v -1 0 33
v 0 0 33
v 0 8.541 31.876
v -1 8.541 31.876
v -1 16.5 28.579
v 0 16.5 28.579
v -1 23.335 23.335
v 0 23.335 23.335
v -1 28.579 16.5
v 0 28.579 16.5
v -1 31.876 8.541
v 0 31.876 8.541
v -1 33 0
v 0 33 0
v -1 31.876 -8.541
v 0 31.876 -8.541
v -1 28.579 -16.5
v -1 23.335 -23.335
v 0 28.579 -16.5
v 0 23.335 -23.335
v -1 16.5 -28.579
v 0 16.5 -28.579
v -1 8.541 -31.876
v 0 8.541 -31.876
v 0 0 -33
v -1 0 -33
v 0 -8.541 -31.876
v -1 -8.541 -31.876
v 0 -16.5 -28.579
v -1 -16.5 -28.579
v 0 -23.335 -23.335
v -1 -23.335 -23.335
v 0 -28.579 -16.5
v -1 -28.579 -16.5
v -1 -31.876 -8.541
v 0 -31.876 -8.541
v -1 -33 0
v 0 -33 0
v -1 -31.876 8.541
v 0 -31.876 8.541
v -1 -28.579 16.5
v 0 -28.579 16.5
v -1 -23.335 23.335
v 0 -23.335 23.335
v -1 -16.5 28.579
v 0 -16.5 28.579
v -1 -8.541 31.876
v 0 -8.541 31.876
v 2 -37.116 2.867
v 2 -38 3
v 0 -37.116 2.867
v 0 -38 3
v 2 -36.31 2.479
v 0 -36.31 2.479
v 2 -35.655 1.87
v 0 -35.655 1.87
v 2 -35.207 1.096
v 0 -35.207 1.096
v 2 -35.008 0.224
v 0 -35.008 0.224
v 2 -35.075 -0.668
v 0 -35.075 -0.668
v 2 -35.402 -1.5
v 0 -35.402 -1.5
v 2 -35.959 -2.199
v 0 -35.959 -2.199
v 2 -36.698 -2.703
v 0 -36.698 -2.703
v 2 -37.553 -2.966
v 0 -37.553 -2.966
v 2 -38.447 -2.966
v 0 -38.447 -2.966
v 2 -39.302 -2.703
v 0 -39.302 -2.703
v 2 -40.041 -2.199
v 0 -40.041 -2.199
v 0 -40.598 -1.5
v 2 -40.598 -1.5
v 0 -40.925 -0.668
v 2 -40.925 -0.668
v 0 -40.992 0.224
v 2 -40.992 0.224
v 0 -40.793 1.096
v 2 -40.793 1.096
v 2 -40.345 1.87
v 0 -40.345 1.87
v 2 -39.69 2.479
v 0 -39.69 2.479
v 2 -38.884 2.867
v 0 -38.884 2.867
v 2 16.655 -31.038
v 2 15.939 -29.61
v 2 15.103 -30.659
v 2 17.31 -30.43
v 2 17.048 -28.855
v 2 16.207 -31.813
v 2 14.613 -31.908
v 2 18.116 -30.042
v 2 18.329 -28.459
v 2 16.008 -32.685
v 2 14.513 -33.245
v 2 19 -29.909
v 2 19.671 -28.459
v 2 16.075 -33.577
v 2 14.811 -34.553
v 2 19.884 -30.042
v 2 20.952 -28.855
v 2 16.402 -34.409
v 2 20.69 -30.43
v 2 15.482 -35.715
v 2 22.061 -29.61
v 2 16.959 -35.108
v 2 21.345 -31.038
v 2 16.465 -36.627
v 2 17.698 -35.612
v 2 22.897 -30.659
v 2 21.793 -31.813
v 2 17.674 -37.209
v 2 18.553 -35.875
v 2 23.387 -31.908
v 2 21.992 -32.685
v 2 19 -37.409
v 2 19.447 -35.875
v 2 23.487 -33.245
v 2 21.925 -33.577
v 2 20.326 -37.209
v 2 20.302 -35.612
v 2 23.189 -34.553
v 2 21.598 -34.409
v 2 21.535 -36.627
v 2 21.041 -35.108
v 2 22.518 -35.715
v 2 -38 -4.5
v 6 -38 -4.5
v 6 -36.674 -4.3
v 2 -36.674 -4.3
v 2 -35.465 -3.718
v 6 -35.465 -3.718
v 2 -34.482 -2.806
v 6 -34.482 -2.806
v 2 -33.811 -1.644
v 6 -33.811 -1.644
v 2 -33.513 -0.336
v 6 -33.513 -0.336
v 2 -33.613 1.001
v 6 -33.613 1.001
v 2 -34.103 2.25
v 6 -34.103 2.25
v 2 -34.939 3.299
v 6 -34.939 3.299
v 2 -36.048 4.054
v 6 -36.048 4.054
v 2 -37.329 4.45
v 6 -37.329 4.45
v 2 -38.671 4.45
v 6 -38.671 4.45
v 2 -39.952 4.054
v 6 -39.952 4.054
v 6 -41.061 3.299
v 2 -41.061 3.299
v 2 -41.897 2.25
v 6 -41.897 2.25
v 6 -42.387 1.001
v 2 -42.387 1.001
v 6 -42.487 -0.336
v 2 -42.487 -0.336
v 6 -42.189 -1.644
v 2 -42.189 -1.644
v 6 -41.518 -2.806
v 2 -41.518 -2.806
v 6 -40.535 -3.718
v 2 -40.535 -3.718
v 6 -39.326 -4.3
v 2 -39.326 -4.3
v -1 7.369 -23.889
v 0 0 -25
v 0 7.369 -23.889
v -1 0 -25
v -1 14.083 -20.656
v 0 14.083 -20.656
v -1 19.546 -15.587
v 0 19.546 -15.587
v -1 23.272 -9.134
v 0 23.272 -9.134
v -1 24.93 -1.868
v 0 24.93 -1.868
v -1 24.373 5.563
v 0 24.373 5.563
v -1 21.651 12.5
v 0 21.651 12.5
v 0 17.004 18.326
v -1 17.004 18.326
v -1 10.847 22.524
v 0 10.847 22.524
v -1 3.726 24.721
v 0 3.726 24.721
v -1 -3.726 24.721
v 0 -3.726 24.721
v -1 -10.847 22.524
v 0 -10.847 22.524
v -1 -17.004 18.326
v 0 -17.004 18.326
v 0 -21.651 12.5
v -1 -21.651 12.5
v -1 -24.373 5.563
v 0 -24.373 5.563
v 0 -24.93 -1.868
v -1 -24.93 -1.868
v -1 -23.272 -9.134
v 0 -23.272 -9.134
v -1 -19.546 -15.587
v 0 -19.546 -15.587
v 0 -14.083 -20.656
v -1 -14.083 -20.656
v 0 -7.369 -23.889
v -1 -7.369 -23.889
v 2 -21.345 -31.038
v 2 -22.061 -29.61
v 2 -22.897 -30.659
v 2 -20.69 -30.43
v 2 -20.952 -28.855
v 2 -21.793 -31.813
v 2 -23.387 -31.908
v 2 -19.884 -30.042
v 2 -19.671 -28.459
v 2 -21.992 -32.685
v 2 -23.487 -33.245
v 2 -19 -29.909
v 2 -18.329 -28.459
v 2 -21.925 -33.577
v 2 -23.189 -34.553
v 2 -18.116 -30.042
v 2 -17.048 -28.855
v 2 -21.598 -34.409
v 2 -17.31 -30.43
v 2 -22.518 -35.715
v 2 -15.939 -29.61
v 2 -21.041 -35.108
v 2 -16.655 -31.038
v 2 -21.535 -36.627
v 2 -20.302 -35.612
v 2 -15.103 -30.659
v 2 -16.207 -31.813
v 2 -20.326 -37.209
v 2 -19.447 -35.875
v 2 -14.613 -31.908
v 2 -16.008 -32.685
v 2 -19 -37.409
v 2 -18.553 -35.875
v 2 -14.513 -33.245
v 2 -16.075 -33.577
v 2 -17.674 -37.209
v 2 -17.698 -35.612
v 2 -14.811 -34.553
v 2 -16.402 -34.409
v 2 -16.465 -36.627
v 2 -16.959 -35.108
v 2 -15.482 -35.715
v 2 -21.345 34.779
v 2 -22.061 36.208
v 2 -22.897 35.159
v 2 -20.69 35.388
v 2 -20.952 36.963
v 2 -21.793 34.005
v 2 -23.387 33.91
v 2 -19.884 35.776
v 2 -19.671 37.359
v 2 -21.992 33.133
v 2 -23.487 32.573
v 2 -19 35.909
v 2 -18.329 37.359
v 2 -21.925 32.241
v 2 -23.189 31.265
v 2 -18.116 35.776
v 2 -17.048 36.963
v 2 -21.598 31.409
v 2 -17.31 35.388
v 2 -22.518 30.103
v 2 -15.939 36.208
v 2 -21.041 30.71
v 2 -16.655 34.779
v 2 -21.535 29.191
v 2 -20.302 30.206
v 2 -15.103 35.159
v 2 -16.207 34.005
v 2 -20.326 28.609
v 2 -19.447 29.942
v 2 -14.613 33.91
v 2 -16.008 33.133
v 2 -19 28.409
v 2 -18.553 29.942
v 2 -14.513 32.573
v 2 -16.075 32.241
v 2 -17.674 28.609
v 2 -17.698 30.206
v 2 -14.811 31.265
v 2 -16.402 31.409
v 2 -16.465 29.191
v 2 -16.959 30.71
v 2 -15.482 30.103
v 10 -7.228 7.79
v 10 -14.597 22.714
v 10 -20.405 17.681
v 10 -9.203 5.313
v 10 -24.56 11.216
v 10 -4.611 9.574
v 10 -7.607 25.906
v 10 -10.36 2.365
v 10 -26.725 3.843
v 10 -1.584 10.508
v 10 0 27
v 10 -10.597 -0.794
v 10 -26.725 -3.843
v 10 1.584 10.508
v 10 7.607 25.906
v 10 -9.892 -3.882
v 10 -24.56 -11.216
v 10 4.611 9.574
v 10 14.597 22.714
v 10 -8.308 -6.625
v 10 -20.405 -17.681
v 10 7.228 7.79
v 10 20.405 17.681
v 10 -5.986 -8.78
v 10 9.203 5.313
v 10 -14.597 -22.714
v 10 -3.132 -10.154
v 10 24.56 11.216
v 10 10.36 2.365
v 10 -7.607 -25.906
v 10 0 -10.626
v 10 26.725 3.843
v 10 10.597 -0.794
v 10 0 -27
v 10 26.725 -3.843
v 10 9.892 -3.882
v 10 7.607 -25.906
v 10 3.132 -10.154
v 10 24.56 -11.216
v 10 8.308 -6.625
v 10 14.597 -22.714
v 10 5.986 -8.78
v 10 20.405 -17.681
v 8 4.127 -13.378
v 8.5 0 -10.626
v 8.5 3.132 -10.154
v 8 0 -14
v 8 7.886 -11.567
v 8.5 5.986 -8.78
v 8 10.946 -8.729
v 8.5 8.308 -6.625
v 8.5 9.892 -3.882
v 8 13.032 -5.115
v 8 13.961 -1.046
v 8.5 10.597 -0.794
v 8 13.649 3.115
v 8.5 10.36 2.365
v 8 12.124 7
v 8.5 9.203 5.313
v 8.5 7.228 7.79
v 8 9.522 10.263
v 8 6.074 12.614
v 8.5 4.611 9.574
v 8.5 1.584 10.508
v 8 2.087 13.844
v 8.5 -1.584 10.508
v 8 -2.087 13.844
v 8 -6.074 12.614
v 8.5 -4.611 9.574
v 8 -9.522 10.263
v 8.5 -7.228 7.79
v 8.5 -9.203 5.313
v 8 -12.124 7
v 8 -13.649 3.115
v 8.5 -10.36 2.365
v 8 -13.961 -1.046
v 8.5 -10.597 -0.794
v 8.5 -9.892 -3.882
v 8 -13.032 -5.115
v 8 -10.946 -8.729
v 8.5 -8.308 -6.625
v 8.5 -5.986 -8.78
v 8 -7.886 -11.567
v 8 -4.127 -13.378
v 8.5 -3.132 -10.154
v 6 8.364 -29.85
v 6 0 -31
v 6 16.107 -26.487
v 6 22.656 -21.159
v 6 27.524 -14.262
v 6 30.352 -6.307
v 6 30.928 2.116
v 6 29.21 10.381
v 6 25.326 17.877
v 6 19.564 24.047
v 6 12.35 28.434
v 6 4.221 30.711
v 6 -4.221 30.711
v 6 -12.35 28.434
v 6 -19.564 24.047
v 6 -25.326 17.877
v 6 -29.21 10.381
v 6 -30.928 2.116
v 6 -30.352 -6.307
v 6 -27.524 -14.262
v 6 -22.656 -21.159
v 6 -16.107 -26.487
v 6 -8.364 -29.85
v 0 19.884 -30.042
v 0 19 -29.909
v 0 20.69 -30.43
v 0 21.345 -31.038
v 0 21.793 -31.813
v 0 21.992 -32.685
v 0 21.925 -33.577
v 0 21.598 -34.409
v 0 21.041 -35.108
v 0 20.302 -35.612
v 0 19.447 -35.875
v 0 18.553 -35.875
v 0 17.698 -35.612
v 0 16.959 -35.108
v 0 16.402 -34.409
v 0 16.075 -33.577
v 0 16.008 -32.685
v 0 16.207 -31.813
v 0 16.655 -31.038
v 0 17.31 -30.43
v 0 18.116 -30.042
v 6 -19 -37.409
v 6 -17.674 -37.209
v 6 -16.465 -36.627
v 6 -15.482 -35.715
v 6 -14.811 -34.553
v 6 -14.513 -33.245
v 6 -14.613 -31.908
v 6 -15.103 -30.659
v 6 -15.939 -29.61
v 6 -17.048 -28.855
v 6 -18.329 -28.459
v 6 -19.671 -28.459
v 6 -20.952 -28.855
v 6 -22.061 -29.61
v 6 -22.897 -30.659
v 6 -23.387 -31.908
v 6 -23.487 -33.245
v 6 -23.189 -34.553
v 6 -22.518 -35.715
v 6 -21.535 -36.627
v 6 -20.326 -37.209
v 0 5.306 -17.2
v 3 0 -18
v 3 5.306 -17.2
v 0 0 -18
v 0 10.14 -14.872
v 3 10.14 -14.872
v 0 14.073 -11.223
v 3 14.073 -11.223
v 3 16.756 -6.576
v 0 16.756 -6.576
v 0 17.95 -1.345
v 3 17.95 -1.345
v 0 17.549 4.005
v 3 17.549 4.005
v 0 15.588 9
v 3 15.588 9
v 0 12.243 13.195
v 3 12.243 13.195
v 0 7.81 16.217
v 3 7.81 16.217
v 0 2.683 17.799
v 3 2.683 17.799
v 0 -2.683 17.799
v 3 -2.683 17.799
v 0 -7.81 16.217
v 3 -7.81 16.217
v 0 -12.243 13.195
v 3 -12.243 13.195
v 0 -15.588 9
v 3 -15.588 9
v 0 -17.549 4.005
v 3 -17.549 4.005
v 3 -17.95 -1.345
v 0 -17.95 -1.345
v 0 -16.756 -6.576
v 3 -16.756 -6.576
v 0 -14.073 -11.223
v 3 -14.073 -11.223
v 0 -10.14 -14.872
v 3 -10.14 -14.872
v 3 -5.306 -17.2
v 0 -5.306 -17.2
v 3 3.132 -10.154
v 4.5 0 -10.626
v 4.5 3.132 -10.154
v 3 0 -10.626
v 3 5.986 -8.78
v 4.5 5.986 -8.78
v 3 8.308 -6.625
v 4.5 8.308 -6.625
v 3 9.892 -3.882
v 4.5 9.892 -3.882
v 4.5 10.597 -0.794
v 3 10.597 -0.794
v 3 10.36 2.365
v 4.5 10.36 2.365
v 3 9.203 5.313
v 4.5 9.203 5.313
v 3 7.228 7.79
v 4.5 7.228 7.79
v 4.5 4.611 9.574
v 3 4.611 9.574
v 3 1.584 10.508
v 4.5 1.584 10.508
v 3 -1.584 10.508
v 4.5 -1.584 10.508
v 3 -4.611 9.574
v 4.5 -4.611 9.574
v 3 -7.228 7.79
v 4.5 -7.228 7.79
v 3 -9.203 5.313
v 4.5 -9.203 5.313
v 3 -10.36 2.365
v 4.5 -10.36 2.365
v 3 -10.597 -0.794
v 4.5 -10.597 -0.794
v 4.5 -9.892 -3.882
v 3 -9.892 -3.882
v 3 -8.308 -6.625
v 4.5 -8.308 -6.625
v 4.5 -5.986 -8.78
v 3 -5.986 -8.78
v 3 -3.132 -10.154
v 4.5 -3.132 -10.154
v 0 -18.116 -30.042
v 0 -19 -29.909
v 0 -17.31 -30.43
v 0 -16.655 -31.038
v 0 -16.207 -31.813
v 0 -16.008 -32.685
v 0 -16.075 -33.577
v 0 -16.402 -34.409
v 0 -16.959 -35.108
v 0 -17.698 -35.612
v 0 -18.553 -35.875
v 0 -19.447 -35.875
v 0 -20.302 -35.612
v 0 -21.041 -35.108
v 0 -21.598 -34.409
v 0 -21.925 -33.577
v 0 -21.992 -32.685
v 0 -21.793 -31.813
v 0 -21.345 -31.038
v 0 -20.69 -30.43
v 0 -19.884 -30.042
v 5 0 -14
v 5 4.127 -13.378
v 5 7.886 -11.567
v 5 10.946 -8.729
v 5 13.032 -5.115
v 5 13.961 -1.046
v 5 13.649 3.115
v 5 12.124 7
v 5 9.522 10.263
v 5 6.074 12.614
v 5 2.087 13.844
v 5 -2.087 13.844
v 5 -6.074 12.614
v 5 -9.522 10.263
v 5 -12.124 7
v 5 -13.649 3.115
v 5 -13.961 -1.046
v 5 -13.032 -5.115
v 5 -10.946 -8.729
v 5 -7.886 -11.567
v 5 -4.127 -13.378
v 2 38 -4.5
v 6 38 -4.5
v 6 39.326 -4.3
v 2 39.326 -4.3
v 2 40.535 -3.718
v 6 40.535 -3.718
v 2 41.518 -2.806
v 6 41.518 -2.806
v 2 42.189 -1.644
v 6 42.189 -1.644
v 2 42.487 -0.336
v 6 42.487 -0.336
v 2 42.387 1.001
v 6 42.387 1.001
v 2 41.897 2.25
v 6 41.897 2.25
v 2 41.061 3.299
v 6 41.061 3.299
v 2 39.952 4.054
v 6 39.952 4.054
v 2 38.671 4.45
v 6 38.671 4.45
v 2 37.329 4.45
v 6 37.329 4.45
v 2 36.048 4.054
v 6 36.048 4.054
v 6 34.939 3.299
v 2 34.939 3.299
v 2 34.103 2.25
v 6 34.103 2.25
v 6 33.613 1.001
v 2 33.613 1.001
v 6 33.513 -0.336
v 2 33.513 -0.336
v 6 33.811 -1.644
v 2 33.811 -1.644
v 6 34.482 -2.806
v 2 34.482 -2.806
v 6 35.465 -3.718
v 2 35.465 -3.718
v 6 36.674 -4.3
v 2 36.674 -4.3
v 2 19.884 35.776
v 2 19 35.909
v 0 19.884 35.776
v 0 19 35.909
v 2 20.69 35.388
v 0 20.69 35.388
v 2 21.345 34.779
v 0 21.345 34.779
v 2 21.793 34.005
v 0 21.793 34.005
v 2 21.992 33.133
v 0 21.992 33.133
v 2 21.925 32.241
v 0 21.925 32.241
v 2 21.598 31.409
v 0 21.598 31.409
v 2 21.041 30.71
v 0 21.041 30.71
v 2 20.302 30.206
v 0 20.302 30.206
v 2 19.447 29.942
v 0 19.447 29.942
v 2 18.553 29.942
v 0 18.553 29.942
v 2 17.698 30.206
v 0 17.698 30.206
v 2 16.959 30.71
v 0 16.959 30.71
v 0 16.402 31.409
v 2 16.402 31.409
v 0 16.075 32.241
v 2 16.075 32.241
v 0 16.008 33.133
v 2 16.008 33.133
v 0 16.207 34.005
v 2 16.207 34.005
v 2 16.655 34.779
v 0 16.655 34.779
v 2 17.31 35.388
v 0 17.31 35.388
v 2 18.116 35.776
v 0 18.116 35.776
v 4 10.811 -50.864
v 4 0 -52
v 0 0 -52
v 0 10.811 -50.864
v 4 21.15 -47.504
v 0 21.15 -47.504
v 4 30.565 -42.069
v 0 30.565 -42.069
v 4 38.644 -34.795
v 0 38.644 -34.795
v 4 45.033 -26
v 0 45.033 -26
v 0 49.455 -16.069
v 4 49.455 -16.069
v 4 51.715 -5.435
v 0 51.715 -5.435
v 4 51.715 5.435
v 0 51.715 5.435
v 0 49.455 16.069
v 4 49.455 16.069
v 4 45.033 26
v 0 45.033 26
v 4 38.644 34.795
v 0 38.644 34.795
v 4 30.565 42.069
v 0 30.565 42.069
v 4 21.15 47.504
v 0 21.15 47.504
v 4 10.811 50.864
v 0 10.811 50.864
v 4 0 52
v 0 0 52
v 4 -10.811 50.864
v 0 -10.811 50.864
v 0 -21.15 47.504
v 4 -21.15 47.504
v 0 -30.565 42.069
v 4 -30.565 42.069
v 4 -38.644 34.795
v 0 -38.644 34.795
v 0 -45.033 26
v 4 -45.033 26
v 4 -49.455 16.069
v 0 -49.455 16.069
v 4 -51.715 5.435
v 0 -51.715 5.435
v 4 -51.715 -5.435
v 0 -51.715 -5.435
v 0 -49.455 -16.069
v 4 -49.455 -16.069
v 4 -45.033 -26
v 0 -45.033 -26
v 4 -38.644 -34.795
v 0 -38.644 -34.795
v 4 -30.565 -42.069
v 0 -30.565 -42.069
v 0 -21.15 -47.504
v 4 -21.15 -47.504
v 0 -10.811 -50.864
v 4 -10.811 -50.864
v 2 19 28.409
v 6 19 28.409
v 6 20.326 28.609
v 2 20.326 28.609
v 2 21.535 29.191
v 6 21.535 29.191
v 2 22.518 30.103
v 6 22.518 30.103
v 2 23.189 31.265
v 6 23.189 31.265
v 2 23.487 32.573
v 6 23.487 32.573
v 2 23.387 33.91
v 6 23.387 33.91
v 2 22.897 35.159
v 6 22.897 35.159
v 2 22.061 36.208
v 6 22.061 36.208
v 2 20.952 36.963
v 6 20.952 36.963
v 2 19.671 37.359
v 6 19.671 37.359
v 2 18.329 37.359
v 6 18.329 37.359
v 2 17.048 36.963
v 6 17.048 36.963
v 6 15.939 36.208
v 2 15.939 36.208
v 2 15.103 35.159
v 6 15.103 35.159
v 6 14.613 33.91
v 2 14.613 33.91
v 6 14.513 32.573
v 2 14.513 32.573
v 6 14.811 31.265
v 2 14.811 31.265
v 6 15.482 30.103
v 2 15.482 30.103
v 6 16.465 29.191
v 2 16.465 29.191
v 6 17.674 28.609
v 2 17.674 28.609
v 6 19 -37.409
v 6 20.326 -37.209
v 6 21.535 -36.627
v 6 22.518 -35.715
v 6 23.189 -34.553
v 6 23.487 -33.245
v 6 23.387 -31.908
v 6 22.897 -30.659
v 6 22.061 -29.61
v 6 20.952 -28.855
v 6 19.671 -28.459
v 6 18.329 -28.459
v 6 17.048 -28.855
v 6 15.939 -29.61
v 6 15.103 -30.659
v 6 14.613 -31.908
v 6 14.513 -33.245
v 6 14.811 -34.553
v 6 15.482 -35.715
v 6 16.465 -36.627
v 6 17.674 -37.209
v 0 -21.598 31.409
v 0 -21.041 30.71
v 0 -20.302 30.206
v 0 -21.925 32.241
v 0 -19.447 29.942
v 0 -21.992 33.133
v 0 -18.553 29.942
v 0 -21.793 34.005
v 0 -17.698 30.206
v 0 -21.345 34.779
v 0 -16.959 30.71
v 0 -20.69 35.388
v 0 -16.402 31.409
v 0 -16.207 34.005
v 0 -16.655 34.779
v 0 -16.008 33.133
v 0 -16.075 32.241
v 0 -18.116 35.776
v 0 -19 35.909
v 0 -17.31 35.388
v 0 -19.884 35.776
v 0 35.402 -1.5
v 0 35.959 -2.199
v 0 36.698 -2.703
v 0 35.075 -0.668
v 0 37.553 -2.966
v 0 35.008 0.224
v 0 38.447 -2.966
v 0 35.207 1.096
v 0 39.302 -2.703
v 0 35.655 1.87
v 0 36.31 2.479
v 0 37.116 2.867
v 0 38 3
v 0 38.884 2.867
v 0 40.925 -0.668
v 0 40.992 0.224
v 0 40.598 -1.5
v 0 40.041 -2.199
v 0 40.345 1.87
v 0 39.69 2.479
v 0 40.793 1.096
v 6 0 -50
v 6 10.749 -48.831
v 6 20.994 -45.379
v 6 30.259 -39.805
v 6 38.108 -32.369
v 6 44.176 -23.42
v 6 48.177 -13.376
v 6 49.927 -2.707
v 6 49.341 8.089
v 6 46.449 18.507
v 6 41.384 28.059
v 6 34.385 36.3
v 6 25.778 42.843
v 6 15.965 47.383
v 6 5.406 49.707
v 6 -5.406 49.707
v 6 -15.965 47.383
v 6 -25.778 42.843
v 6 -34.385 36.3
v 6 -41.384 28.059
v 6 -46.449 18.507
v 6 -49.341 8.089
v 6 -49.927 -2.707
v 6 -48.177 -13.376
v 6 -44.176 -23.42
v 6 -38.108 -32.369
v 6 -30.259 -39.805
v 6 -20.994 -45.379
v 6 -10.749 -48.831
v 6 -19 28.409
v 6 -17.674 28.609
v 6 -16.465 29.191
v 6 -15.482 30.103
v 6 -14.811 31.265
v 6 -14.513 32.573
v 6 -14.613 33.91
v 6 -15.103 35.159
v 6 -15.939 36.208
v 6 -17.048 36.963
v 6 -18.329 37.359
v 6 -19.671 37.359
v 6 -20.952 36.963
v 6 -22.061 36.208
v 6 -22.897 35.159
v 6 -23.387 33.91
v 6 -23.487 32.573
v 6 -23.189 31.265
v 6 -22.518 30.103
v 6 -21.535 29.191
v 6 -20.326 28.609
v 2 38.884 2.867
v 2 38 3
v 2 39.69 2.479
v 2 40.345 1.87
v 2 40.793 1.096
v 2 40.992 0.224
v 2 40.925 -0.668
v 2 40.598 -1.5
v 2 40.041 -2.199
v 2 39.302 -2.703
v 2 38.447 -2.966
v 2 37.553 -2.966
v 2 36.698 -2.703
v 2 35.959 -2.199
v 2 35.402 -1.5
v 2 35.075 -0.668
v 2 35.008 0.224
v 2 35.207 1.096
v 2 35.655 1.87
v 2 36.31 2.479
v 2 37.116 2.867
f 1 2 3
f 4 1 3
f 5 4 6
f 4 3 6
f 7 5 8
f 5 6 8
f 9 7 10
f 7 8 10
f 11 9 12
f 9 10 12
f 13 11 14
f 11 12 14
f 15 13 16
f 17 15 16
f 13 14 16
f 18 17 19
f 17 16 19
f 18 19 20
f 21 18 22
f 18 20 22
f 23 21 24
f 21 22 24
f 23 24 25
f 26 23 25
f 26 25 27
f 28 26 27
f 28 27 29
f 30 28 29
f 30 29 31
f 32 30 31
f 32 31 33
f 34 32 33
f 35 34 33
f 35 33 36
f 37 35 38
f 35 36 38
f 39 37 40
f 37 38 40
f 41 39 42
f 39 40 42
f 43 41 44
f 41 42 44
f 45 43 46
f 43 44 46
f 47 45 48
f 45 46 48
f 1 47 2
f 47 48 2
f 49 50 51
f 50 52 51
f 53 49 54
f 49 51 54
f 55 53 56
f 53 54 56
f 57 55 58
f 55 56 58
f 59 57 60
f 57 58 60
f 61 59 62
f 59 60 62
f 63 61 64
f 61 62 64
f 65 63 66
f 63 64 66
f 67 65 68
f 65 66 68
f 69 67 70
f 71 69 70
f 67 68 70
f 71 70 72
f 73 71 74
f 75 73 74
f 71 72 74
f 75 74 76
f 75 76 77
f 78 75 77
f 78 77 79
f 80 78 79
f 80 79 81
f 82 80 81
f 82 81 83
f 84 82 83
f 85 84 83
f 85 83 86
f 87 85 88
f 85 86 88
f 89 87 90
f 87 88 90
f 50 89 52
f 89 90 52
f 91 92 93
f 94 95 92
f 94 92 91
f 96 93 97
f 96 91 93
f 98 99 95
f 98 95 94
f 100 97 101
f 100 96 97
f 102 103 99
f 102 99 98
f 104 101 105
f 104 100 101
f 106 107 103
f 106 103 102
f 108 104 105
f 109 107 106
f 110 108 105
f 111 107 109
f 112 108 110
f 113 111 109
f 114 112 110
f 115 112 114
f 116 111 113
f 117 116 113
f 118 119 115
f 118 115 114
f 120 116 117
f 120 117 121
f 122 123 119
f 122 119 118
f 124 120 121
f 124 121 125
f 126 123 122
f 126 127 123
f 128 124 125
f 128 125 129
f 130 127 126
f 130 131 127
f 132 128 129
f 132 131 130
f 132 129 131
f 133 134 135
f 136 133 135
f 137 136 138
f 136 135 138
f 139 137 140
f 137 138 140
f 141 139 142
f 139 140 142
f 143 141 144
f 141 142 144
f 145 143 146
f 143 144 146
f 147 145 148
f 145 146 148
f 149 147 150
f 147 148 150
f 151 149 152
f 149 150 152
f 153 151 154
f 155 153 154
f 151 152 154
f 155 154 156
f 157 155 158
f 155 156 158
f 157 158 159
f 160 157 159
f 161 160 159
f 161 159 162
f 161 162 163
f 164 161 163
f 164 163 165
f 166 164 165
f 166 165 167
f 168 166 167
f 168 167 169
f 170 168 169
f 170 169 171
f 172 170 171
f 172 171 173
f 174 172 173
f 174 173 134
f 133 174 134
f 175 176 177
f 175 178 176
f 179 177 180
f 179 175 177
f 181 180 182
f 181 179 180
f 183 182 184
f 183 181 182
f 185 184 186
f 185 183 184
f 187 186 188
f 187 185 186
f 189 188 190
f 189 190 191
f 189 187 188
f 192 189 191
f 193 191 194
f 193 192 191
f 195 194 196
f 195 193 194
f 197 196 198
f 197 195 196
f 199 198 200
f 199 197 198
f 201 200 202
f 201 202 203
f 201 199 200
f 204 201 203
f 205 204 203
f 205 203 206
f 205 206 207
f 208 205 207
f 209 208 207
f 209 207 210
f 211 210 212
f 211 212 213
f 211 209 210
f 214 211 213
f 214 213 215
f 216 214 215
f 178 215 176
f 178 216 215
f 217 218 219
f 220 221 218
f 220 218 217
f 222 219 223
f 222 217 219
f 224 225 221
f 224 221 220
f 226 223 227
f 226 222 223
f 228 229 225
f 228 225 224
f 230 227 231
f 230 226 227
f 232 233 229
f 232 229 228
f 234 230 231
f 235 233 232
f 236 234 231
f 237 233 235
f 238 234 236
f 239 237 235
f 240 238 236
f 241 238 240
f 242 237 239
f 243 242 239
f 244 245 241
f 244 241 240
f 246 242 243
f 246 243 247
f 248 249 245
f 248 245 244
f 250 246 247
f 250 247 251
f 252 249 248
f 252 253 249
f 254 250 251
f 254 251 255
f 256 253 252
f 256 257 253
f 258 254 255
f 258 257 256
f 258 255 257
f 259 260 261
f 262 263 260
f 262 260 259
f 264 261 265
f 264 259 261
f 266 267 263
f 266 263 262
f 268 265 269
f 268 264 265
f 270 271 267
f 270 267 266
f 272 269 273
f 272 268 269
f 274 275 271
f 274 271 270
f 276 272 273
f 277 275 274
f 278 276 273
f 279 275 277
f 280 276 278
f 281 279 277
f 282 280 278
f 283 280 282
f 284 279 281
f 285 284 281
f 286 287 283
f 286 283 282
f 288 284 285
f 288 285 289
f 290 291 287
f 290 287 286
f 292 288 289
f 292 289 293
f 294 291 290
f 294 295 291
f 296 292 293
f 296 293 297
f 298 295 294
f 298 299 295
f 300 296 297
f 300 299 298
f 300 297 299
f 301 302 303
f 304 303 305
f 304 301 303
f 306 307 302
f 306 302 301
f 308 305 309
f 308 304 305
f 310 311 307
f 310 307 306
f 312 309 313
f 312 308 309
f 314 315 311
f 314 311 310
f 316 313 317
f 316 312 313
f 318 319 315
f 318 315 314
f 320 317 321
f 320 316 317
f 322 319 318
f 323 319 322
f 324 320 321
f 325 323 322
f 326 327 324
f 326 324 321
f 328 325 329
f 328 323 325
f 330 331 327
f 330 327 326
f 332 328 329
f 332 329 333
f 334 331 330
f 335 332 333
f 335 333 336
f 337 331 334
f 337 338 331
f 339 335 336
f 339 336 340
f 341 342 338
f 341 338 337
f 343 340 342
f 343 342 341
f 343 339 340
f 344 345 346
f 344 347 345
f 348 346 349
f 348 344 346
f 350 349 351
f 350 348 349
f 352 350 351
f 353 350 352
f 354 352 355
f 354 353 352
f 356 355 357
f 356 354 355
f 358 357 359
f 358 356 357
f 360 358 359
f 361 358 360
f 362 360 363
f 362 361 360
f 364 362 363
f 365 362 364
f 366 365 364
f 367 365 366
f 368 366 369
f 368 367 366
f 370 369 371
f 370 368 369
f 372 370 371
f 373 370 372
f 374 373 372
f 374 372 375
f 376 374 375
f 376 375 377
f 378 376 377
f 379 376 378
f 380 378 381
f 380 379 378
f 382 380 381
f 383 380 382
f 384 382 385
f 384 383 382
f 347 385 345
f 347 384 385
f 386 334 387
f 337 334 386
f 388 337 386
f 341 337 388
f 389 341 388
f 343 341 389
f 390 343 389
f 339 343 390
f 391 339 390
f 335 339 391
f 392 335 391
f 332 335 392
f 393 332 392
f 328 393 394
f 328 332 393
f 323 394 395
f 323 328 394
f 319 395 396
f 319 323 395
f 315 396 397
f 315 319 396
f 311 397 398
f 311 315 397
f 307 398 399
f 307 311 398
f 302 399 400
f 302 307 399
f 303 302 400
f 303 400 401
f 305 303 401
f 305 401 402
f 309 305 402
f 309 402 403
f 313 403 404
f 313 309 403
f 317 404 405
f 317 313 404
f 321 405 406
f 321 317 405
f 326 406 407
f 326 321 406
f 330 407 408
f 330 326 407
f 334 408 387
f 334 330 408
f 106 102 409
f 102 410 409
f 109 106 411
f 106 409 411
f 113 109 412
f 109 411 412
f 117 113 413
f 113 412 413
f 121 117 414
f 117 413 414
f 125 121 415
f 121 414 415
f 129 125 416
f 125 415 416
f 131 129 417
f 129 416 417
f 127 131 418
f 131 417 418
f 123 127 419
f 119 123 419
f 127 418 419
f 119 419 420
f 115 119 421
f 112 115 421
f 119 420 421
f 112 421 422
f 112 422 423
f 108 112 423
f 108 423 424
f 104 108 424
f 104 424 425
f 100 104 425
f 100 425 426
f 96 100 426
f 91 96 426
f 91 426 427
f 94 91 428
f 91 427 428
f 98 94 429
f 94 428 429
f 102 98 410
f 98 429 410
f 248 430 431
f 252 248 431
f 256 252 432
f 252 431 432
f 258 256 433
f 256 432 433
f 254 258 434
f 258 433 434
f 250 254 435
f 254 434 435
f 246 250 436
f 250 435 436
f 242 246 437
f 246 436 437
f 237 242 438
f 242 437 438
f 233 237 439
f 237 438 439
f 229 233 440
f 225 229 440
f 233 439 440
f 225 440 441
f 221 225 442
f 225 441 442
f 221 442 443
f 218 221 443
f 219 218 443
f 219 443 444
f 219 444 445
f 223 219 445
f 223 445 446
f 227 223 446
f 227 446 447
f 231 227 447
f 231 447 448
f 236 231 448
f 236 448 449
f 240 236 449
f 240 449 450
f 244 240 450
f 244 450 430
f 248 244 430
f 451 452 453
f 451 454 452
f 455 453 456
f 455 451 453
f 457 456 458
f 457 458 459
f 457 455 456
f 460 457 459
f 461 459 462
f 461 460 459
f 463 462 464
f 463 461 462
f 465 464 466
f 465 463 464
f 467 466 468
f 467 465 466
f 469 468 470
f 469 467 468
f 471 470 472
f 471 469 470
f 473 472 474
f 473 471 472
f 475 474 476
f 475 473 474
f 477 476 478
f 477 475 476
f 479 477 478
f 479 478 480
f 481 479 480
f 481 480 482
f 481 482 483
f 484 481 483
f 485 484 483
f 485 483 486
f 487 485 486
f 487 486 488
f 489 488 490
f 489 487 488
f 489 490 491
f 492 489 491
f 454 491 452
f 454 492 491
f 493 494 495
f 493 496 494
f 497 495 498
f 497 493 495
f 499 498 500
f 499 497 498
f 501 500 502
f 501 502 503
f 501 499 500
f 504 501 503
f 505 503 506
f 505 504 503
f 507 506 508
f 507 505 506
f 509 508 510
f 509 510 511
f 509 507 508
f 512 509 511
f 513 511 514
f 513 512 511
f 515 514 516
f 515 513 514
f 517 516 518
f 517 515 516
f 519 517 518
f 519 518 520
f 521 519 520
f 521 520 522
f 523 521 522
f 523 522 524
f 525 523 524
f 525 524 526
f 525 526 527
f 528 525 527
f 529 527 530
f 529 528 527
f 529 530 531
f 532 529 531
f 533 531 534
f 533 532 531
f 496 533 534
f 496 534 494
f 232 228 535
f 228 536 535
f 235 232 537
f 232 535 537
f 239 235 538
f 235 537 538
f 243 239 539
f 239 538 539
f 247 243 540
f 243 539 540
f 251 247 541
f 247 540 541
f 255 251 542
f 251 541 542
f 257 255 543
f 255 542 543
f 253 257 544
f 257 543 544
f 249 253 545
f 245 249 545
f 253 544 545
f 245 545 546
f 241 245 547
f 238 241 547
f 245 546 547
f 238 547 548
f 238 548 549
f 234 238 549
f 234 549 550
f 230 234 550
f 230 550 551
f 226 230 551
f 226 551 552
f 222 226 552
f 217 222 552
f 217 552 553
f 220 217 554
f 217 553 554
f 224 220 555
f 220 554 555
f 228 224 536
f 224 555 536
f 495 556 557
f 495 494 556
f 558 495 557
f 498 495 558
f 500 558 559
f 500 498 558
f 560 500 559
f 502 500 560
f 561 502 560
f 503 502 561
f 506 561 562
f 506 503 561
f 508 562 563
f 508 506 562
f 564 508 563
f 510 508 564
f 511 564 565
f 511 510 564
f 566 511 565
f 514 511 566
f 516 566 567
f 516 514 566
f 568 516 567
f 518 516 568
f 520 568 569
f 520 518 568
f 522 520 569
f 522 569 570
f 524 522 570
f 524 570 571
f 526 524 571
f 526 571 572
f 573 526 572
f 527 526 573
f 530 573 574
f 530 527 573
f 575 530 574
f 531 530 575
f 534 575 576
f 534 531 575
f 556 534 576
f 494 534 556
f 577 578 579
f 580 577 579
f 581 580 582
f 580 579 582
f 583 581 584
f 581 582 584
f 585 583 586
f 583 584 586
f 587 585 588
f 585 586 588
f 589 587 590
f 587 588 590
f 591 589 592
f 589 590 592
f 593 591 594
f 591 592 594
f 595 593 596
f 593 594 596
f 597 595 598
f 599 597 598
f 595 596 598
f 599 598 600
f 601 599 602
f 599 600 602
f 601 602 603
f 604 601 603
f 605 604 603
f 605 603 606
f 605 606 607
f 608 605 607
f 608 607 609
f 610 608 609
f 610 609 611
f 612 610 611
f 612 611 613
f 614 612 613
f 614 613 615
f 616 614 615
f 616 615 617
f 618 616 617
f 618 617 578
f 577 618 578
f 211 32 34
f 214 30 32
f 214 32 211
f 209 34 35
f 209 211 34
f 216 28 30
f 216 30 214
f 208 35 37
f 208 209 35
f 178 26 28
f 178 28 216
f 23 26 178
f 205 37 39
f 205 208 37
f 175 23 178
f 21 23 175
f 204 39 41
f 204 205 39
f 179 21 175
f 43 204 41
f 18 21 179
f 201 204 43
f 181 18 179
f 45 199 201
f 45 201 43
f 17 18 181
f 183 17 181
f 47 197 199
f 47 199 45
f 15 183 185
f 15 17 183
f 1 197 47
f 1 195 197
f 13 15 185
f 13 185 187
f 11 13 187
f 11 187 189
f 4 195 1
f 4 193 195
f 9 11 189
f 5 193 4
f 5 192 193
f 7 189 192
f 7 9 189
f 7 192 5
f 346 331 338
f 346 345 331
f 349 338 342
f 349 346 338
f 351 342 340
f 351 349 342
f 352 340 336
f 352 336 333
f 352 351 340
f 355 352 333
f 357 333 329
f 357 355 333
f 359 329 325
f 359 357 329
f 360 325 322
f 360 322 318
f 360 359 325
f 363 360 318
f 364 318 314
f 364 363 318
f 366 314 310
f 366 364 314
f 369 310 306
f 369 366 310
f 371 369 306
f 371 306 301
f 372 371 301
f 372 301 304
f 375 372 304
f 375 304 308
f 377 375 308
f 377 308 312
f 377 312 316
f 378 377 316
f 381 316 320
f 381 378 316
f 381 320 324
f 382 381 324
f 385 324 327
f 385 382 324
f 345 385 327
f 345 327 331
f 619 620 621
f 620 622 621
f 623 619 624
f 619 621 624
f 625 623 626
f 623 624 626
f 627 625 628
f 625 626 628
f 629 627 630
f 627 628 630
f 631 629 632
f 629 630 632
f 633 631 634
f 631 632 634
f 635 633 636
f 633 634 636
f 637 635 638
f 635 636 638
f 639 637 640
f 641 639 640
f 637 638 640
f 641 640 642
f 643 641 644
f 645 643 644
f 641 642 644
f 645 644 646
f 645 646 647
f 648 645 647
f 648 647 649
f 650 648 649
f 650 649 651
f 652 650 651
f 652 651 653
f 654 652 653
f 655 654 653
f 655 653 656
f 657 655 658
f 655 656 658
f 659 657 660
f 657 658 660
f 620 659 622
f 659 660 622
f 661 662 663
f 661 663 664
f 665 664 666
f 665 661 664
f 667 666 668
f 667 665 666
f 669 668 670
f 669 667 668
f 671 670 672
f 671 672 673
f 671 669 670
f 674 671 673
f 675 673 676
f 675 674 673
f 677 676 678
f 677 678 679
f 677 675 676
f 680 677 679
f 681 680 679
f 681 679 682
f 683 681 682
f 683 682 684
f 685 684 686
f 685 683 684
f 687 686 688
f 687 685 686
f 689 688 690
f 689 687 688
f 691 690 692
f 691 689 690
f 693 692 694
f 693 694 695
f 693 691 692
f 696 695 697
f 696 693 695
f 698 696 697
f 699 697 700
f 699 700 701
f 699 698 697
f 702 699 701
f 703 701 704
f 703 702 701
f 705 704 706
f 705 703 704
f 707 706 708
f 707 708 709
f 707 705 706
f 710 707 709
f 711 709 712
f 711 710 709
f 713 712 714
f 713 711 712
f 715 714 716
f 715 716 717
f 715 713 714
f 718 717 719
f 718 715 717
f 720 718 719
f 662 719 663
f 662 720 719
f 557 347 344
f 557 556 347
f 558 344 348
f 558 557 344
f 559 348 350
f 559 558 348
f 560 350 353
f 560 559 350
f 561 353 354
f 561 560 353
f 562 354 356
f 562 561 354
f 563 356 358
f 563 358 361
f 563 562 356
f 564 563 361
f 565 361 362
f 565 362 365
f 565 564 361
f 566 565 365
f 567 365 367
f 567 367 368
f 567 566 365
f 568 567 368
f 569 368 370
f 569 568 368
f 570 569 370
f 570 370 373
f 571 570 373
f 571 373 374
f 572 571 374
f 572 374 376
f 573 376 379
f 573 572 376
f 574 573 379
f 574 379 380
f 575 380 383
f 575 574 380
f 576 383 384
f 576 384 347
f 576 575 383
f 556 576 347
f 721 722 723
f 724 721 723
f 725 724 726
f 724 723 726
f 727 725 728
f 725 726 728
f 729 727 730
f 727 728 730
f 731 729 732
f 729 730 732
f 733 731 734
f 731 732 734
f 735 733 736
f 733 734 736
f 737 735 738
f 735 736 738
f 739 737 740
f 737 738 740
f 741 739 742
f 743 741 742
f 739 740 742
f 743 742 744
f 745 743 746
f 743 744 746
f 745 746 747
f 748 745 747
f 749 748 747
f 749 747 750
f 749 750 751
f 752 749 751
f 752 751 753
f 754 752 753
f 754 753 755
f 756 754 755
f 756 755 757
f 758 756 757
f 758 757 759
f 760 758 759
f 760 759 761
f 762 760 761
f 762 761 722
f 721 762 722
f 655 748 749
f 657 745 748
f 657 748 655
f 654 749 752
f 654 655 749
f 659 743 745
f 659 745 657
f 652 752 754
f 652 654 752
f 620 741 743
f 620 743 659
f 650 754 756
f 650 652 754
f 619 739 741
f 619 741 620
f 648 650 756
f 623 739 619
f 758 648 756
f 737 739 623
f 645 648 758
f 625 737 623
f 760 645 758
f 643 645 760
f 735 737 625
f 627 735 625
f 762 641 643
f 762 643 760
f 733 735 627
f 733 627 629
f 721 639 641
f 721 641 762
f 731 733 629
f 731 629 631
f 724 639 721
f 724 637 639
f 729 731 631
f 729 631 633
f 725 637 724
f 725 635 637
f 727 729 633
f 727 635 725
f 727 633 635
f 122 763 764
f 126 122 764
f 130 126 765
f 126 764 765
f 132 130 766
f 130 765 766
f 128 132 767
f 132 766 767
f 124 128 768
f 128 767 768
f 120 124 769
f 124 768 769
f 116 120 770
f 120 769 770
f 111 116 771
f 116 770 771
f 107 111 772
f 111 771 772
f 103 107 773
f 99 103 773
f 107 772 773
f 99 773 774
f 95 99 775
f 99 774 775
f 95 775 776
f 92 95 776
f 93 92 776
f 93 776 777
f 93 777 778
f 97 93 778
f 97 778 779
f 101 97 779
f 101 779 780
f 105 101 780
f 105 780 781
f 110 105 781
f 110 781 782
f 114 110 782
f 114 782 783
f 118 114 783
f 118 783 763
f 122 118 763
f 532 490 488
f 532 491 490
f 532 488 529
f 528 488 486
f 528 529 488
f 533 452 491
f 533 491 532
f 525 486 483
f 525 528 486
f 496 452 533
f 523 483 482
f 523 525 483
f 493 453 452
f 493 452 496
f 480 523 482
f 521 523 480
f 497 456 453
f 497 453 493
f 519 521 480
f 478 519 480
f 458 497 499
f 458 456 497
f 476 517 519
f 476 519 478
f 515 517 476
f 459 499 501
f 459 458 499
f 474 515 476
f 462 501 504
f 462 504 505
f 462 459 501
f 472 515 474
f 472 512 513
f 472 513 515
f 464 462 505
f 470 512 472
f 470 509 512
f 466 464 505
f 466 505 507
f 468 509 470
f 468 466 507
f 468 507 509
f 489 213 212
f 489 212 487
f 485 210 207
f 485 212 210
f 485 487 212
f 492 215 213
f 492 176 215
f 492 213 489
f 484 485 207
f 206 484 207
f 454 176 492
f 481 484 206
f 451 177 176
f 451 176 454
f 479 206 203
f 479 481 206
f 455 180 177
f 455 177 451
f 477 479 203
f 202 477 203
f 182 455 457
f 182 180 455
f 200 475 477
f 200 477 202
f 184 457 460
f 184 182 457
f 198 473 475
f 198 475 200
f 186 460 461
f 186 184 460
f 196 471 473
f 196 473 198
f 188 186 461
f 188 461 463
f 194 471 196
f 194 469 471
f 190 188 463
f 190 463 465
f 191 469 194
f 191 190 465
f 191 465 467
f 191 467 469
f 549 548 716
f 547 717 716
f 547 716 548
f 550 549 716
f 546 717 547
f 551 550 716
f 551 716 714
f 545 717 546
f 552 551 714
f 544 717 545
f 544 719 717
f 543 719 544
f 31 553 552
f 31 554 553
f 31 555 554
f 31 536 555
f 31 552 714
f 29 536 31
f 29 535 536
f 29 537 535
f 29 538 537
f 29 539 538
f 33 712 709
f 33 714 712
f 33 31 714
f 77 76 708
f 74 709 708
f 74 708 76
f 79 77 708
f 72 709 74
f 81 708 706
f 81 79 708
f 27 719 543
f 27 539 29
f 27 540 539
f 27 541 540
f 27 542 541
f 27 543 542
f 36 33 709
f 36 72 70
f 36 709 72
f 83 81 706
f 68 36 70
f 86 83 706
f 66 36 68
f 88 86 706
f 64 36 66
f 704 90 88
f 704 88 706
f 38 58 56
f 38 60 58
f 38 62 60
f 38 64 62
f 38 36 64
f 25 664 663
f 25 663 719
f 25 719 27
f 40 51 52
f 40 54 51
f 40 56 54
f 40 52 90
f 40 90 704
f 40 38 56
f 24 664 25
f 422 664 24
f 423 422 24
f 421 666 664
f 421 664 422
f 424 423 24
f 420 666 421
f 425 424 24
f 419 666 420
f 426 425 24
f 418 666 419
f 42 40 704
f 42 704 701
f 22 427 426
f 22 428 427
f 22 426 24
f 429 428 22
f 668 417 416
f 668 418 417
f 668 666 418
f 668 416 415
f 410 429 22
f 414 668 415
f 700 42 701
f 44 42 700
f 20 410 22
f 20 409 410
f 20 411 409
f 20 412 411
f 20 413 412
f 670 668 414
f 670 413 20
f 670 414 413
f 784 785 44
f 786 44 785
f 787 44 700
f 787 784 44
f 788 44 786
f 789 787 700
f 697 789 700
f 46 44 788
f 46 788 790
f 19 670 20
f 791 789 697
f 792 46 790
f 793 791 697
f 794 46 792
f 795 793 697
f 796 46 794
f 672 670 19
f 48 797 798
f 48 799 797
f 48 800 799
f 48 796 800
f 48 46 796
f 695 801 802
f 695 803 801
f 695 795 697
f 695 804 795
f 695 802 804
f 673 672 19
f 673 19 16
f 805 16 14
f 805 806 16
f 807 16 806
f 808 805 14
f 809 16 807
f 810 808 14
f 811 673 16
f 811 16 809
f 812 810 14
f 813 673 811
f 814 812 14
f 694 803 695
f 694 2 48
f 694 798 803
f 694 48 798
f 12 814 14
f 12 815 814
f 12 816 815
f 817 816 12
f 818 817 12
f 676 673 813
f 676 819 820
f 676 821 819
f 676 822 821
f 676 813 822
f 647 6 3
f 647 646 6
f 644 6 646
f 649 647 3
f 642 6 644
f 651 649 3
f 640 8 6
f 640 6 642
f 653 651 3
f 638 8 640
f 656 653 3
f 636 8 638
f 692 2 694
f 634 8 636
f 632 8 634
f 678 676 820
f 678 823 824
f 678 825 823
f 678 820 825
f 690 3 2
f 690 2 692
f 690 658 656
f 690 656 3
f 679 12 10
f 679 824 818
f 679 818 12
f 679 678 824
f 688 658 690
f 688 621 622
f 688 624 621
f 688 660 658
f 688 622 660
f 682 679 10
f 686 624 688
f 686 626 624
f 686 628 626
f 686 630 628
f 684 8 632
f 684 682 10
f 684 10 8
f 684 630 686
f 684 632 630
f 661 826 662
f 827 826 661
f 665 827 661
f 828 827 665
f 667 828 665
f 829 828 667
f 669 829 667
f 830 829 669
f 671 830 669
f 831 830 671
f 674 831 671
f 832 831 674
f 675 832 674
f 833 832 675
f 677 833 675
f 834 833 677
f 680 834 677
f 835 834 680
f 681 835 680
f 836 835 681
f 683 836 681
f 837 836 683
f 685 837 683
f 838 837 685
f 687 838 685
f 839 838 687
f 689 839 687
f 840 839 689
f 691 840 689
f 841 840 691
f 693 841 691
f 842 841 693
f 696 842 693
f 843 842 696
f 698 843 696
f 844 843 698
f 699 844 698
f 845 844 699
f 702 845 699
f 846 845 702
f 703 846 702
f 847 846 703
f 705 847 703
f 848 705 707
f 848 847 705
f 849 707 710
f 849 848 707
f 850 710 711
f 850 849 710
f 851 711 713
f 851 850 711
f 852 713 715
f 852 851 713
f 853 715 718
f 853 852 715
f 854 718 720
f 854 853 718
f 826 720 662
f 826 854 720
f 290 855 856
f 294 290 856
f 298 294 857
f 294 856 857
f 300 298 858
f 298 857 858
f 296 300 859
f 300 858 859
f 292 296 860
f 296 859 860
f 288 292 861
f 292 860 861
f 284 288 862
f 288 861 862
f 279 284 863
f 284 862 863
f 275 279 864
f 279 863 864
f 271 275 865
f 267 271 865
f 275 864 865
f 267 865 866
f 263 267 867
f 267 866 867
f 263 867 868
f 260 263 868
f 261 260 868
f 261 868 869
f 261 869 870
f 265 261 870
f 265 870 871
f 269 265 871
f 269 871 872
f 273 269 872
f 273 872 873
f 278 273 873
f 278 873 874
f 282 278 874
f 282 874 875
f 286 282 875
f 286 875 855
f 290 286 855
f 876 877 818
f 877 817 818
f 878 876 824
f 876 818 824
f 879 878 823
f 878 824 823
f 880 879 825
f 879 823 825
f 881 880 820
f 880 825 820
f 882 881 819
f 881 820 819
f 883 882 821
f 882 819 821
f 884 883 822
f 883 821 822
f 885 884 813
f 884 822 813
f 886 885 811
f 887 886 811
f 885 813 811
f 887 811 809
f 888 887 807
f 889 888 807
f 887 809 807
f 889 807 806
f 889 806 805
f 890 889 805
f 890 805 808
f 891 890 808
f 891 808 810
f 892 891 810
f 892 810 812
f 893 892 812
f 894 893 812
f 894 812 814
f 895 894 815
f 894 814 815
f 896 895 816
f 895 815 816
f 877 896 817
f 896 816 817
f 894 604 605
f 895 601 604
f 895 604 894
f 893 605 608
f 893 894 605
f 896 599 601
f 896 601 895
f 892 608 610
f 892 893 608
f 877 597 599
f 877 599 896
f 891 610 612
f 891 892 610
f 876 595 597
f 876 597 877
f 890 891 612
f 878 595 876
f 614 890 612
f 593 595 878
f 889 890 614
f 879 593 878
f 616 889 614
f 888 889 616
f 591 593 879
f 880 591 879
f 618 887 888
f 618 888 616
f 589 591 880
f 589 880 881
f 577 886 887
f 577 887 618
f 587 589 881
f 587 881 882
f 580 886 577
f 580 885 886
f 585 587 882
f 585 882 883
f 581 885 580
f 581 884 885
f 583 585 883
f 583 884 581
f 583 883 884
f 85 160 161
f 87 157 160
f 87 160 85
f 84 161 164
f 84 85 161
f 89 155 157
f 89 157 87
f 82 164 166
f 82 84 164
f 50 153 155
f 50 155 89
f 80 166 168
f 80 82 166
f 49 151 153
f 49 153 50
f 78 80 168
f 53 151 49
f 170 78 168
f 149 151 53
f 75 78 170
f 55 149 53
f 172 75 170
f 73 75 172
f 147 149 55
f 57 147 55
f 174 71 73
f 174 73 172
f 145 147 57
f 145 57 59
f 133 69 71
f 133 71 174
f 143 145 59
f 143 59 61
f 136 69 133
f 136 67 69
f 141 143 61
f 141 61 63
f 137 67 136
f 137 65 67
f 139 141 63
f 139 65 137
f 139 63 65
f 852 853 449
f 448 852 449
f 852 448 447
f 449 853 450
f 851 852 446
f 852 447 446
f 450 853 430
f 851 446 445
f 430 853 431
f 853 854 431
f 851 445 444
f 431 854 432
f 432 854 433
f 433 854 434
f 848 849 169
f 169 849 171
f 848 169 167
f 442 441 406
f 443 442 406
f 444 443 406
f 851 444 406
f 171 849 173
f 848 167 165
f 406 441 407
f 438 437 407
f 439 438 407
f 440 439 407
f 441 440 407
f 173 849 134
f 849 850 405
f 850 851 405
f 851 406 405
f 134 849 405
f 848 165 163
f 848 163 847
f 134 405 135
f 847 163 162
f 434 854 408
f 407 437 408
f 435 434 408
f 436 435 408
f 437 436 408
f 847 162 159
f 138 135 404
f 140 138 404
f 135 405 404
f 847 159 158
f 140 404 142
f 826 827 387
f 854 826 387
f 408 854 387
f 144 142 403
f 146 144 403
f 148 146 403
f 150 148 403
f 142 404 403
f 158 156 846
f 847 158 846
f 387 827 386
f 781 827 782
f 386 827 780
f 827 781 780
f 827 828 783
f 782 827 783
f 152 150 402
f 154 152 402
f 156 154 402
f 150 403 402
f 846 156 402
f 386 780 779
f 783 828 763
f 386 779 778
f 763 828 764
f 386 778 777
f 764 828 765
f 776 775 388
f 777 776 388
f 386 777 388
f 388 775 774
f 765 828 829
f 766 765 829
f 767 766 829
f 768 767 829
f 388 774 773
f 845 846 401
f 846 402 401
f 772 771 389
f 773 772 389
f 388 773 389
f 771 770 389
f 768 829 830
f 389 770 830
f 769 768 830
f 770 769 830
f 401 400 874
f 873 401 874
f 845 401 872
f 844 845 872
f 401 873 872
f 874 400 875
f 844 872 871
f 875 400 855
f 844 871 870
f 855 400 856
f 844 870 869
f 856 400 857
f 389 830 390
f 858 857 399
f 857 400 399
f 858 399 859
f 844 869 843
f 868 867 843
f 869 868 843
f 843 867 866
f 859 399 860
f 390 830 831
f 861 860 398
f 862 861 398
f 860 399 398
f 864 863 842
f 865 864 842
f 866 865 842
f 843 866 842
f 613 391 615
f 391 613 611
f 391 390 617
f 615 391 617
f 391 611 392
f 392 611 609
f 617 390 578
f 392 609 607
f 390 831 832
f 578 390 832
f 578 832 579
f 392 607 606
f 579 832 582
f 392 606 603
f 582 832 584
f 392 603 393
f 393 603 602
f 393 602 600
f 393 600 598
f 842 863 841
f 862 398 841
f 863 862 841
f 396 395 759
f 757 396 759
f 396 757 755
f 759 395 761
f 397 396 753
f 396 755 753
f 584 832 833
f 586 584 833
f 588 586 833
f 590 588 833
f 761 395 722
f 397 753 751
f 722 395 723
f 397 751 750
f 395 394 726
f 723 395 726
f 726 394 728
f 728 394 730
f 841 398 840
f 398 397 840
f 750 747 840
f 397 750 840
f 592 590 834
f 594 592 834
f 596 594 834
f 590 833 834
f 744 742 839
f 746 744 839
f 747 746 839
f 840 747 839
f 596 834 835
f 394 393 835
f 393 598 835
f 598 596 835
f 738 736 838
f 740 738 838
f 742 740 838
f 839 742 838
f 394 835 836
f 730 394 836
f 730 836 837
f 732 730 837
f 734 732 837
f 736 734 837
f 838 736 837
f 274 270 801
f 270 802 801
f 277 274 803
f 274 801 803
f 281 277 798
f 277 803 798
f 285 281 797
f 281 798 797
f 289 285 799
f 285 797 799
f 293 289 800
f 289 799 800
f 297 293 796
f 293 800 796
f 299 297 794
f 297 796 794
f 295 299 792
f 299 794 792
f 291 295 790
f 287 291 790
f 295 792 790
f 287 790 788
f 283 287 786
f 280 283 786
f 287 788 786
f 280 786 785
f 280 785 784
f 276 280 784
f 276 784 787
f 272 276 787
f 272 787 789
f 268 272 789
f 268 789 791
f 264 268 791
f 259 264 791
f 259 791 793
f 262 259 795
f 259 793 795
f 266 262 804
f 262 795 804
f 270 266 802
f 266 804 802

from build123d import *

# Parameters (mm, degrees)
SKETCH_1_W                = 6
SKETCH_1_H                = 52
SKETCH_2_R                = 31
EXTRUDE_1_DEPTH           = 4
EXTRUDE_1_TAPER           = 45
SKETCH_3_R                = 33
EXTRUDE_2_DEPTH           = 1
HOLE_WIZARD_1_D           = 6
HOLE_WIZARD_1_DEPTH       = 7
HOLE_WIZARD_1_CBORE_D     = 9
HOLE_WIZARD_1_CBORE_DEPTH = 4
CHAMFER_1_SIZE            = 2


with BuildPart() as part:
    # Эскиз1 → Повернуть1 (revolve)
    with BuildSketch(Plane.XY, mode=Mode.PRIVATE) as revolve_1_sk:
        with Locations((3, 26)):
            Rectangle(SKETCH_1_W, SKETCH_1_H)
    revolve(revolve_1_sk.sketch.rotate(Axis((0, 0, 0), (1, 0, 0)), 270), axis=Axis((0, 0, 0), (1, 0, 0)))

    # Эскиз2 → Бобышка-Вытянуть1 (add)
    with BuildSketch(Plane(origin=(6, 0, 0), x_dir=(0, 0, -1), z_dir=(1, 0, 0))):
        Circle(SKETCH_2_R)
    extrude(amount=EXTRUDE_1_DEPTH, taper=EXTRUDE_1_TAPER)

    # Эскиз3 → Бобышка-Вытянуть2 (add)
    with BuildSketch(Plane.ZY):
        Circle(SKETCH_3_R)
    extrude(amount=EXTRUDE_2_DEPTH)

    # Эскиз4 → Вырез-Повернуть1 (revolve, cut)
    with BuildSketch(Plane.XY, mode=Mode.PRIVATE) as cut_revolve_1_sk:
        Polygon((-1, 25), (-1, 0), (10, 0), (10, 10.626409128), (8.5, 10.626409128), (8, 14), (5, 14), (4.5, 10.626409128), (3, 10.626409128), (3, 18), (0, 18), (0, 25), align=None)
    revolve(cut_revolve_1_sk.sketch.rotate(Axis((-1, 0, 0), (1, 0, 0)), 270), axis=Axis((-1, 0, 0), (1, 0, 0)), mode=Mode.SUBTRACT)

    # Отверстие1
    with Locations(Plane(origin=(6, 0, 0), x_dir=(0, 0, -1), z_dir=(1, 0, 0))):
        with Locations((32.908965344, -19), (0, -38), (-32.908965344, -19), (-32.908965344, 19), (0, 38), (32.908965344, 19)):
            CounterBoreHole(HOLE_WIZARD_1_D / 2, HOLE_WIZARD_1_CBORE_D / 2, HOLE_WIZARD_1_CBORE_DEPTH, depth=HOLE_WIZARD_1_DEPTH)

    # Фаска1
    chamfer_1_edges = [part.edges().sort_by_distance(p)[0] for p in [
        (6, 0, 52),
    ]]
    chamfer(chamfer_1_edges, length=CHAMFER_1_SIZE)


solid = part.part
